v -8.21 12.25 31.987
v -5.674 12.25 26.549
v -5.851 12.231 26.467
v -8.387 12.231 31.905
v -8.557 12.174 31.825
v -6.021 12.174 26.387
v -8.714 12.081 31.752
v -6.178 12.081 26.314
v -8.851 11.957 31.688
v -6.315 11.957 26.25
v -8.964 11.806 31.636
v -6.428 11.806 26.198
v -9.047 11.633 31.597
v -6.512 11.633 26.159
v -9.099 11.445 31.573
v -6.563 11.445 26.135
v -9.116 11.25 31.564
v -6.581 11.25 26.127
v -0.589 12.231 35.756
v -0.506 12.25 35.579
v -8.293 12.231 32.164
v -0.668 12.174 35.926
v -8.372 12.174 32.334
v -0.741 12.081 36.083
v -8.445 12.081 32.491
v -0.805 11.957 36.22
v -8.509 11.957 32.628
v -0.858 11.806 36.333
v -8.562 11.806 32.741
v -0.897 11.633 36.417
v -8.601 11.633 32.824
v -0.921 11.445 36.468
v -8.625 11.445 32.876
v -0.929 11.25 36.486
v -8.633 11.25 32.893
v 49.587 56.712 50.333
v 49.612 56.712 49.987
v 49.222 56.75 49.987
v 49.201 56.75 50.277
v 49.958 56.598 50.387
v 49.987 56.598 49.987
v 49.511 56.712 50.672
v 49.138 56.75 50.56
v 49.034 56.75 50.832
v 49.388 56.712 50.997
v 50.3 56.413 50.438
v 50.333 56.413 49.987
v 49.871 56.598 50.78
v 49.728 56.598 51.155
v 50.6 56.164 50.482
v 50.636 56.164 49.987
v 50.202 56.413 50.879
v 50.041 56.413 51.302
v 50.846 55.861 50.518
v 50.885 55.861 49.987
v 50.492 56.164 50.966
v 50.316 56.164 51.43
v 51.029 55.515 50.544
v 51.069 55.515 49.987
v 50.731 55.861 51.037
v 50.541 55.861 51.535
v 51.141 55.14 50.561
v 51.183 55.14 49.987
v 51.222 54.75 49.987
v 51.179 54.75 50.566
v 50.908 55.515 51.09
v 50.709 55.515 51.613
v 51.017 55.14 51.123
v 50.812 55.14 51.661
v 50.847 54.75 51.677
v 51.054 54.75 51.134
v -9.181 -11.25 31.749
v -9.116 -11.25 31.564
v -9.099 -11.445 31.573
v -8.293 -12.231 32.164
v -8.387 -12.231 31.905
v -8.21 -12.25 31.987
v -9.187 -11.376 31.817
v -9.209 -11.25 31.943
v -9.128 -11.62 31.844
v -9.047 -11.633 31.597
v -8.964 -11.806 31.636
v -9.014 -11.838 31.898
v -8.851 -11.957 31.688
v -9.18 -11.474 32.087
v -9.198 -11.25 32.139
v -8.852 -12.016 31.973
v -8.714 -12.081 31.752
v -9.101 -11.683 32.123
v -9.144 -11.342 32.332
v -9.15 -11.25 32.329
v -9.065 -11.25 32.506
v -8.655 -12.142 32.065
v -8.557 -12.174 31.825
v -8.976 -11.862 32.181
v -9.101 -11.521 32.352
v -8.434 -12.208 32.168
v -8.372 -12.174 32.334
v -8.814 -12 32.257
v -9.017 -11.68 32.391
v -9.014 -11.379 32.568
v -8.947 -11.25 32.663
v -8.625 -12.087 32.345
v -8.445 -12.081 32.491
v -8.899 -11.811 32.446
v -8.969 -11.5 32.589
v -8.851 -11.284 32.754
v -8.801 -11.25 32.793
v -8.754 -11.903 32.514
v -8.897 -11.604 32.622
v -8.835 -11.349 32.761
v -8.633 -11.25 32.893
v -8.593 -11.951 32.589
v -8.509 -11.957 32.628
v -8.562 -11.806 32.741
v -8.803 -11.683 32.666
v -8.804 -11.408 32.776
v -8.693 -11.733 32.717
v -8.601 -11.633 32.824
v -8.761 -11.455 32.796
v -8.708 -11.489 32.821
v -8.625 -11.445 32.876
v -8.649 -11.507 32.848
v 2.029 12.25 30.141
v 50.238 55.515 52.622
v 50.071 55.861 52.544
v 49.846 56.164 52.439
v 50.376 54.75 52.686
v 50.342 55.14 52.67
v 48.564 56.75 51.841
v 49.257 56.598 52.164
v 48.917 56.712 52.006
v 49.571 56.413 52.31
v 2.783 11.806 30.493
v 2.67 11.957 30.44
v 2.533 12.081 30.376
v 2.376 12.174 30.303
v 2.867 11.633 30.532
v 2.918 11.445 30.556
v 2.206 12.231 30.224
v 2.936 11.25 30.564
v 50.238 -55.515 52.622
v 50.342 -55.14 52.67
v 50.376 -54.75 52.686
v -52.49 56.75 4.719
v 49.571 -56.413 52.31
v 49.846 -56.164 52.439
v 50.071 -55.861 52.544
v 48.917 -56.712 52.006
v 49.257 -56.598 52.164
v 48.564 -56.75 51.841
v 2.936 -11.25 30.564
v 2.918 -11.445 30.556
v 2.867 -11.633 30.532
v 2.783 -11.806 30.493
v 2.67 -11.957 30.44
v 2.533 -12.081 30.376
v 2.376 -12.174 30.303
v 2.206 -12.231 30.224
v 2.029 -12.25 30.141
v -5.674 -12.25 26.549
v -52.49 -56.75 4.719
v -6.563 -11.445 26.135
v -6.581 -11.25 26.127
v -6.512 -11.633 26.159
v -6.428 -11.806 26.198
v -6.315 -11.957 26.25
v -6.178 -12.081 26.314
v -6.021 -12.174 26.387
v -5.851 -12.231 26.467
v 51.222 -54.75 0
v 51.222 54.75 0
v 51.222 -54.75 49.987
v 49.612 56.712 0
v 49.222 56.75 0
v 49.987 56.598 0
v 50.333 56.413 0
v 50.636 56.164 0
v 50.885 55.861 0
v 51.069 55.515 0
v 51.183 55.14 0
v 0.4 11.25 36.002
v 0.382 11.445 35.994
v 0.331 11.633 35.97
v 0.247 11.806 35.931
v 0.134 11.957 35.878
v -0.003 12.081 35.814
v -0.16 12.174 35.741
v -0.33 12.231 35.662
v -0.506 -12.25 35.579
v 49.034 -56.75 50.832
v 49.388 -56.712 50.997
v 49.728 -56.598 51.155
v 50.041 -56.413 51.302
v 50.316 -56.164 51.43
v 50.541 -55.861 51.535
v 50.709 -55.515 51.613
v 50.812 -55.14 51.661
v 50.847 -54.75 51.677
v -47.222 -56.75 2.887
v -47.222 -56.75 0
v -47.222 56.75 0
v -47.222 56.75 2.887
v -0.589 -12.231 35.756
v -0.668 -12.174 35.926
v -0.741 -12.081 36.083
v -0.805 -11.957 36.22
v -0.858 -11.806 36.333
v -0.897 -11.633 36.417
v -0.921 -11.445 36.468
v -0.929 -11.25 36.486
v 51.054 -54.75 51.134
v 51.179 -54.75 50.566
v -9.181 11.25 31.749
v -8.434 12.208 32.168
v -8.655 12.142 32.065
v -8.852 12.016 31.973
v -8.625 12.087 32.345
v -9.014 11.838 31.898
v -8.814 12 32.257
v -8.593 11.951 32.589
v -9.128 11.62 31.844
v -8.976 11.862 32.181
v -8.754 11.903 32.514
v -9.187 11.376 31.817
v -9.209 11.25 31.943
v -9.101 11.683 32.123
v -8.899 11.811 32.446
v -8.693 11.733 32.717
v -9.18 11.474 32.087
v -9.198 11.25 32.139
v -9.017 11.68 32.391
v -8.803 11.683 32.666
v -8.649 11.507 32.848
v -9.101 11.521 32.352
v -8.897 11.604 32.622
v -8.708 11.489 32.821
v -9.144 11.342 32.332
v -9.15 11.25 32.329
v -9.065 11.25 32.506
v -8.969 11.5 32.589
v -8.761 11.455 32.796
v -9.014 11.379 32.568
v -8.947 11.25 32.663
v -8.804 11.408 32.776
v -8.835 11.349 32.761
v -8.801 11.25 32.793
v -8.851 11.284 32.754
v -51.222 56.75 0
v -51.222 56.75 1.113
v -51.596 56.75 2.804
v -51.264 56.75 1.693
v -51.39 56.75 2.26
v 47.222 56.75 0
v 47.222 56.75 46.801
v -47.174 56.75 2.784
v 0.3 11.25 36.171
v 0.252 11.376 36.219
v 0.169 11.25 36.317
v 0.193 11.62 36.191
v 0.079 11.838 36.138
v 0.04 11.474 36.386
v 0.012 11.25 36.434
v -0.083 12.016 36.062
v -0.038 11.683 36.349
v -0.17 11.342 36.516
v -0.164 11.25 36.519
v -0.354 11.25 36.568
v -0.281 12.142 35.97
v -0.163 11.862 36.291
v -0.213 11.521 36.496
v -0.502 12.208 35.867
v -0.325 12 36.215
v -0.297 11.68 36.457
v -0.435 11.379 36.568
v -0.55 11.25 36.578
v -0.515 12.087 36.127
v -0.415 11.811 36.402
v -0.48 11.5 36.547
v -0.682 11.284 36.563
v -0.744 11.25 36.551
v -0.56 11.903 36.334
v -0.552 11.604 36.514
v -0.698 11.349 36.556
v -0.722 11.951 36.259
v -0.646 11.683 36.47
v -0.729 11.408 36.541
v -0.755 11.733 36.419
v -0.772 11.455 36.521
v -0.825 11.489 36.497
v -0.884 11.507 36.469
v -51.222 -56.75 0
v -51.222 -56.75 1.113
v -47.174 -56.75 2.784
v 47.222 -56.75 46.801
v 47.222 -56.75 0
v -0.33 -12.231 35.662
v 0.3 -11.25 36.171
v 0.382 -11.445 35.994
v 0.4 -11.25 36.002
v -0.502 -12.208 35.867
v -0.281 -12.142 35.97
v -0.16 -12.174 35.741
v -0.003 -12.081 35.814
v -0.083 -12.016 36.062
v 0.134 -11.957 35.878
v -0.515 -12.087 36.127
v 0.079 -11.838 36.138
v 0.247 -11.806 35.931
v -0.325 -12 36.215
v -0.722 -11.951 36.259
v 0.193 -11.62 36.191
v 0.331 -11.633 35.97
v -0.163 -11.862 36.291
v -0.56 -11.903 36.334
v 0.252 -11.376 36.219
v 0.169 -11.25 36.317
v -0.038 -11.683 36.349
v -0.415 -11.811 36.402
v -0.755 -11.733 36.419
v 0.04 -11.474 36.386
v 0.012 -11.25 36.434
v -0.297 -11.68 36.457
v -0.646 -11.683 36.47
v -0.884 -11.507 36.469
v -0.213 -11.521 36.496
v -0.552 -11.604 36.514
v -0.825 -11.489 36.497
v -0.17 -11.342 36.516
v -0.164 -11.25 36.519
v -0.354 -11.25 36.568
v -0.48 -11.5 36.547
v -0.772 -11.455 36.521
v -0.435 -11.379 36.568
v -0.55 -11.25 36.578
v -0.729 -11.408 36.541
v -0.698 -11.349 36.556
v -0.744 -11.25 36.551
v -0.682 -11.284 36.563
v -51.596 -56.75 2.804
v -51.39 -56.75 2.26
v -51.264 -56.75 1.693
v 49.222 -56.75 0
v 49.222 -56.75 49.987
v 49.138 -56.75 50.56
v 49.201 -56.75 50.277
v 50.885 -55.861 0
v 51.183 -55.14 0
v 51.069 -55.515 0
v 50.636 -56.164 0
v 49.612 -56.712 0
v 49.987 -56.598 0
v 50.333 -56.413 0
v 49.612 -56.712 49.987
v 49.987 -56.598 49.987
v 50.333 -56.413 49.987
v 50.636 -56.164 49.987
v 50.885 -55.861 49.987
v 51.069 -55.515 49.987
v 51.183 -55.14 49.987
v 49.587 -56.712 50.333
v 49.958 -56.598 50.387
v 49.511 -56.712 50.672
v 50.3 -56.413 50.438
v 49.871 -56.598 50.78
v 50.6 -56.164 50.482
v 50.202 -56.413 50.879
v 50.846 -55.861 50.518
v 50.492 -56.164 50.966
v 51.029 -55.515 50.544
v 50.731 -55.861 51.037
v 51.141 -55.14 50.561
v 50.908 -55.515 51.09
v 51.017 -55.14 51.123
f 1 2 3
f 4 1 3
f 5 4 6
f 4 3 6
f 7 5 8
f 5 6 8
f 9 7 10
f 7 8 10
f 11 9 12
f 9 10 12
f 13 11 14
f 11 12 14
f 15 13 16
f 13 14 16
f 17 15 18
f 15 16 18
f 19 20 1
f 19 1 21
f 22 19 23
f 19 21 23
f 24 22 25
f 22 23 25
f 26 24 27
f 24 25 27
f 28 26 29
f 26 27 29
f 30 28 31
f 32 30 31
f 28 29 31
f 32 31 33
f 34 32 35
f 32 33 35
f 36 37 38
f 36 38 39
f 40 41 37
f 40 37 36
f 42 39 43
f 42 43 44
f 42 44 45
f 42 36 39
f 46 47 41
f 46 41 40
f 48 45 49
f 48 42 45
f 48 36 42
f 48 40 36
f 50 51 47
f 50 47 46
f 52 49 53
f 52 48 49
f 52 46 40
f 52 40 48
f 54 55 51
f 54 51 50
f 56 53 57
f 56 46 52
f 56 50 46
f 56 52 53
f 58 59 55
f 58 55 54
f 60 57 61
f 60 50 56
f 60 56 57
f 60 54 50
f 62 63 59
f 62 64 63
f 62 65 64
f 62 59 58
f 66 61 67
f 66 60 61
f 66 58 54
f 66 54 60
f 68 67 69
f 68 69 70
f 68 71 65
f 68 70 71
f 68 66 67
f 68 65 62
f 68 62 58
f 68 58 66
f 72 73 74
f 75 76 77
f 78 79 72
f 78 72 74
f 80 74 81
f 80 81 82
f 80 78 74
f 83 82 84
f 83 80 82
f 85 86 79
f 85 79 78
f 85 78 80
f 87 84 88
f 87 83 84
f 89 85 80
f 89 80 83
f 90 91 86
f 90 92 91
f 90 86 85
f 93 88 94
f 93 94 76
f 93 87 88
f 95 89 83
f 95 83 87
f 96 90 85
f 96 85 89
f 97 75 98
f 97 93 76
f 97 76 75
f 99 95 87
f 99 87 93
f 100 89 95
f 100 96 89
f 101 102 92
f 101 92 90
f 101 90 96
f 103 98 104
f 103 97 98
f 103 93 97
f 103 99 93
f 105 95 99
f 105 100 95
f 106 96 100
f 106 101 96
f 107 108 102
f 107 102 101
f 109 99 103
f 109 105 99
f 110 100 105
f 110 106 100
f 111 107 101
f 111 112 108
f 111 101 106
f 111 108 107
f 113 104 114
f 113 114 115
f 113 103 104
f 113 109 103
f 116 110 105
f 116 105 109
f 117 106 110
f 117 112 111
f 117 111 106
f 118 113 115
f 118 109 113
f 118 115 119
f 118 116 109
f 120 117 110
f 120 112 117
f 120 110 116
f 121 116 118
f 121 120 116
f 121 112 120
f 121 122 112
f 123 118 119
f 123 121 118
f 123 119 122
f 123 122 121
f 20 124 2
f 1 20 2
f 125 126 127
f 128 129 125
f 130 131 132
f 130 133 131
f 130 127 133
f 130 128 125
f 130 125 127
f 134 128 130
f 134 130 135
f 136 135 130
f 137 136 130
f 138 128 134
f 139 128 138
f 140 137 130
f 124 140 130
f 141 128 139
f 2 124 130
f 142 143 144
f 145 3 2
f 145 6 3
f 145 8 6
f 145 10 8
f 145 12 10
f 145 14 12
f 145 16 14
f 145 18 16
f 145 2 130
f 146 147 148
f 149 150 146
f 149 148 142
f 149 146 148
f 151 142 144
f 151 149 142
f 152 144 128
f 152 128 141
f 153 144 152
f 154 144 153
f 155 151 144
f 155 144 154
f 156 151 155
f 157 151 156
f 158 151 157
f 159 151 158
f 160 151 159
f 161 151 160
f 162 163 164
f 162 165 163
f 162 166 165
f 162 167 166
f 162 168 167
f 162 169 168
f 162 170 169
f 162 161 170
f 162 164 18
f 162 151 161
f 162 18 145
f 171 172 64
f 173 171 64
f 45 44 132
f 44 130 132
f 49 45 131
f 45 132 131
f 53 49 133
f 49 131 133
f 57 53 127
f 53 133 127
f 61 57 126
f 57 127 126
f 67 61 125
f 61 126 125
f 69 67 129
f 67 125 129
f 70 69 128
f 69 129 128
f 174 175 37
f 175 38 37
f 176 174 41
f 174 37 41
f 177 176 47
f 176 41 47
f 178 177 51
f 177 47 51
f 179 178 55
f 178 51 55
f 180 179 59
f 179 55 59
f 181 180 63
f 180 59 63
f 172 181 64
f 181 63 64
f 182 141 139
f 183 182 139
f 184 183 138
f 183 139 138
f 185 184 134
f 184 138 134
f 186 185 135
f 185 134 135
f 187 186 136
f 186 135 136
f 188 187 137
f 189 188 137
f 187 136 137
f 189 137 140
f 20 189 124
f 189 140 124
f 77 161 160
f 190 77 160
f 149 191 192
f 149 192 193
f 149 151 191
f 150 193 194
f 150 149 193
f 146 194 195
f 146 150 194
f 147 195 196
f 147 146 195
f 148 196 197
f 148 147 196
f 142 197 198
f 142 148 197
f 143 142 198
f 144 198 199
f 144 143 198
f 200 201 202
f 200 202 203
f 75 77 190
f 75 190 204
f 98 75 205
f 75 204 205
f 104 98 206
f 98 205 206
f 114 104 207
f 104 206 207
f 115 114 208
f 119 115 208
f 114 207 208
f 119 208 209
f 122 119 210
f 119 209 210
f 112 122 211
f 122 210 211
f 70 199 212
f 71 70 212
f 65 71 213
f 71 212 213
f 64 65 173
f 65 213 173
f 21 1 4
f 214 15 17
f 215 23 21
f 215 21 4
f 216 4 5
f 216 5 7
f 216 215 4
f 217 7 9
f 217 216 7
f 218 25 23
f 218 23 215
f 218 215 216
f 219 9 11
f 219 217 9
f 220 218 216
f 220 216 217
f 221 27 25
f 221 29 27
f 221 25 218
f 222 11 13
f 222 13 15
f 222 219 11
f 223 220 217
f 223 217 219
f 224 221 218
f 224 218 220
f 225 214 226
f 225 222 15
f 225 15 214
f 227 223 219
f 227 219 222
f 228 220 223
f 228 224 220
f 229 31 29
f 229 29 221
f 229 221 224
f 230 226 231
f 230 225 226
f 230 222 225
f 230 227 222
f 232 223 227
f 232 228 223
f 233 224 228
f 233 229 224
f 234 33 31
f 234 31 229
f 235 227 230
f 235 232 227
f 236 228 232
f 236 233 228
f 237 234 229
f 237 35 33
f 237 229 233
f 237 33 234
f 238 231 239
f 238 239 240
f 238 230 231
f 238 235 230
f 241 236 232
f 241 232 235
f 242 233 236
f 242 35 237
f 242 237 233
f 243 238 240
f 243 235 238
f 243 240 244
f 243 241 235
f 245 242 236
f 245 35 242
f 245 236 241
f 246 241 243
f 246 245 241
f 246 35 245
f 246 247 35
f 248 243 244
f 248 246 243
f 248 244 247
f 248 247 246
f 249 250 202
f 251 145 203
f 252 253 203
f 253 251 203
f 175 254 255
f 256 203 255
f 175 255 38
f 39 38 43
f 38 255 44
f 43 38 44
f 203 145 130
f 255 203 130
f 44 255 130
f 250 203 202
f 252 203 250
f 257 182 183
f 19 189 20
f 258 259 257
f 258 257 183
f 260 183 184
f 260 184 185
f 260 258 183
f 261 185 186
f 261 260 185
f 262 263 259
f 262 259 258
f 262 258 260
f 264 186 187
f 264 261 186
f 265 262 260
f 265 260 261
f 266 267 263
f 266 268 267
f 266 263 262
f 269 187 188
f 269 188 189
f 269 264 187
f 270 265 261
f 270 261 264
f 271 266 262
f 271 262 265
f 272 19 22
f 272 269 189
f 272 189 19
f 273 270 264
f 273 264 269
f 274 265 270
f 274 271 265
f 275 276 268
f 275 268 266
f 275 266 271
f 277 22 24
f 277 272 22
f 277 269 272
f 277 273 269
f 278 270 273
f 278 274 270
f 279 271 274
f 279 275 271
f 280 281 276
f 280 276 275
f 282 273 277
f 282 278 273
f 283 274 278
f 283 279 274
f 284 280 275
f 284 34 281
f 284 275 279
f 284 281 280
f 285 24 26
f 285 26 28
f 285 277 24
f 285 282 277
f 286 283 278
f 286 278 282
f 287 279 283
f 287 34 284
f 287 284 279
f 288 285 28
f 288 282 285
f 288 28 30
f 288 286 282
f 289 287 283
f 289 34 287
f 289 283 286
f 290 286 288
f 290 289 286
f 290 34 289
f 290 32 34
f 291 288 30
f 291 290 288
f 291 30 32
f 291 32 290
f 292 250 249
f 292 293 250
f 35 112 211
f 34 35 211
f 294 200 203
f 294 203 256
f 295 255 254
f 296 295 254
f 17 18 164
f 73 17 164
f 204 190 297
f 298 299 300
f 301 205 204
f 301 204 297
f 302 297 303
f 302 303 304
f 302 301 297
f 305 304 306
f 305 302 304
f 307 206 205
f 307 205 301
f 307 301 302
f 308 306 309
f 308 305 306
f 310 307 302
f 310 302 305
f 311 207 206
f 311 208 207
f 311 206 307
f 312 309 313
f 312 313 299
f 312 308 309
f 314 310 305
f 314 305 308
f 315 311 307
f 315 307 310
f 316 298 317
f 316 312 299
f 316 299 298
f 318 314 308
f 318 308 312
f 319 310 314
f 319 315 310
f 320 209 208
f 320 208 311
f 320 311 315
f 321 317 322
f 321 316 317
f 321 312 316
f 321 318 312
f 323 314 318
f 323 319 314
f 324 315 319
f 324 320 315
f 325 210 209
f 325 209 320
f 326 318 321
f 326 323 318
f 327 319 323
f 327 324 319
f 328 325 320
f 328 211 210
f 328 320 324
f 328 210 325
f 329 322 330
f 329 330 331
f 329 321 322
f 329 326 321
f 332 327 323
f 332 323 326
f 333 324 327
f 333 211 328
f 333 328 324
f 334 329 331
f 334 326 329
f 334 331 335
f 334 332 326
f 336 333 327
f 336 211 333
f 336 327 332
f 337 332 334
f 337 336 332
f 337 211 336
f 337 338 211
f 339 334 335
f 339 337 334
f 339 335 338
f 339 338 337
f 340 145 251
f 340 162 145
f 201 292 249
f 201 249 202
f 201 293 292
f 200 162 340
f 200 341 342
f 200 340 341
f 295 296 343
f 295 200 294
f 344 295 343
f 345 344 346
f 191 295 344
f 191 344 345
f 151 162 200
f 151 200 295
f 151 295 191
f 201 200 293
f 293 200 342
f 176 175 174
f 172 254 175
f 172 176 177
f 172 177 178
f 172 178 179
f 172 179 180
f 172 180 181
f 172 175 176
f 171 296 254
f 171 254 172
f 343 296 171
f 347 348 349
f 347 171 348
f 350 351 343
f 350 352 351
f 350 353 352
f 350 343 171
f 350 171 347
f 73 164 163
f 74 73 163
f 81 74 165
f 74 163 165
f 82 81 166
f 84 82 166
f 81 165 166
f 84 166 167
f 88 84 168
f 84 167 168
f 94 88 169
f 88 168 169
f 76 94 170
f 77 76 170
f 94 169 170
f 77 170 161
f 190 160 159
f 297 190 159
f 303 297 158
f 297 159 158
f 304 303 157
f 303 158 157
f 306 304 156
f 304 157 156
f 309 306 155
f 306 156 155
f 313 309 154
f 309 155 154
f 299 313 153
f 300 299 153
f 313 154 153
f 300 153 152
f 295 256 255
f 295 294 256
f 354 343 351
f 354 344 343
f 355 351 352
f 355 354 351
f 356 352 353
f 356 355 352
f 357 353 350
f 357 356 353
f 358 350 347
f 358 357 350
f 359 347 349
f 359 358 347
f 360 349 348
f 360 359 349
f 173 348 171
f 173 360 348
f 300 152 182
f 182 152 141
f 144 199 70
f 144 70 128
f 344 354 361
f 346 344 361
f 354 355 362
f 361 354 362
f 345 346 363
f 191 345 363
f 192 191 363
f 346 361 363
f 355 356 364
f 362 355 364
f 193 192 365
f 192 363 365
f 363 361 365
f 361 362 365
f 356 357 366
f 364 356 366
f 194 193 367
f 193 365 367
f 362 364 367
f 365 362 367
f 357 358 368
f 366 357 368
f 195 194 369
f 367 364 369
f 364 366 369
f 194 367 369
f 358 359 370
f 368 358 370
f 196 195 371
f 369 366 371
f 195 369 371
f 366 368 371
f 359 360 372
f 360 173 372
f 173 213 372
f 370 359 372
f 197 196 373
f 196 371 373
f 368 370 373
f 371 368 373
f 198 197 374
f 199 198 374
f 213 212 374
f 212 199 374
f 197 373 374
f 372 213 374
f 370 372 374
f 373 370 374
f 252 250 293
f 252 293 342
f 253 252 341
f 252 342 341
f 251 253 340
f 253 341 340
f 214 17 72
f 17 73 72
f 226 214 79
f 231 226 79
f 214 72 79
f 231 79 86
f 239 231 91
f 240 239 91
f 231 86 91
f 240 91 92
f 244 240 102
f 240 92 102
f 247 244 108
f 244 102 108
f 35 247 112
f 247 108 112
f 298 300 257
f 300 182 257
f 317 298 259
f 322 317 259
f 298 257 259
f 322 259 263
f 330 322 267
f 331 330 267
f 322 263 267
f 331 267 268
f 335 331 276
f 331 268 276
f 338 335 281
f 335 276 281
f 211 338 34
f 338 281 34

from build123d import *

# Parameters (mm, degrees)
F1_DEPTH = 56.75
F2_R     = 4
F4_DEPTH = 7
F5_R     = 1
F6_R     = 2


with BuildPart() as f1:
    # F0 (on Front) → F1 (new body, symmetric)
    with BuildSketch(Plane.XZ):
        Polygon((47.2216577835, 0), (51.2216577835, 0), (51.2216577835, 50.8734804946), (50.37642126, 52.6860960687), (-52.4895125687, 4.7189233611), (-51.2216577835, 2), (-51.2216577835, 0), (-47.2216577835, 0), (-47.2216577835, 2.8867786506), (-47.1738083736, 2.7841652599), (47.2216577835, 46.8014940241), align=None)
    extrude(amount=F1_DEPTH, both=True)

    # F2
    f2_edges = [f1.edges().sort_by_distance(p)[0] for p in [
        (51.221658, 0, 50.87348),
        (-51.221658, 0, 2),
    ]]
    fillet(f2_edges, radius=F2_R)

    # F3 (on face) → F4 (join)
    with BuildSketch(Plane(origin=(-11.1824046347, 0, 23.980744127), x_dir=(0.906307787, 0, 0.4226182617), z_dir=(-0.4226182617, 0, 0.906307787))):
        with BuildLine():
            Line((6.0774126859, -12.25), (14.5774126859, -12.25))
            ThreePointArc((14.5774126859, -12.25), (15.2845194671, -11.9571067812), (15.5774126859, -11.25))
            Line((15.5774126859, -11.25), (15.5774126859, 11.25))
            ThreePointArc((15.5774126859, 11.25), (15.2845194671, 11.9571067812), (14.5774126859, 12.25))
            Line((14.5774126859, 12.25), (6.0774126859, 12.25))
            ThreePointArc((6.0774126859, 12.25), (5.3703059047, 11.9571067812), (5.0774126859, 11.25))
            Line((5.0774126859, 11.25), (5.0774126859, -11.25))
            ThreePointArc((5.0774126859, -11.25), (5.3703059047, -11.9571067812), (6.0774126859, -12.25))
        make_face()
    extrude(amount=F4_DEPTH)

    # F5
    f5_edges = [f1.edges().sort_by_distance(p)[0] for p in [
        (-4.780918, -12.25, 34.689452),
    ]]
    fillet(f5_edges, radius=F5_R)

    # F6
    f6_edges = [f1.edges().sort_by_distance(p)[0] for p in [
        (51.221658, -56.75, 24.993351),
        (51.221658, 56.75, 24.993351),
    ]]
    fillet(f6_edges, radius=F6_R)


solid = f1.part
